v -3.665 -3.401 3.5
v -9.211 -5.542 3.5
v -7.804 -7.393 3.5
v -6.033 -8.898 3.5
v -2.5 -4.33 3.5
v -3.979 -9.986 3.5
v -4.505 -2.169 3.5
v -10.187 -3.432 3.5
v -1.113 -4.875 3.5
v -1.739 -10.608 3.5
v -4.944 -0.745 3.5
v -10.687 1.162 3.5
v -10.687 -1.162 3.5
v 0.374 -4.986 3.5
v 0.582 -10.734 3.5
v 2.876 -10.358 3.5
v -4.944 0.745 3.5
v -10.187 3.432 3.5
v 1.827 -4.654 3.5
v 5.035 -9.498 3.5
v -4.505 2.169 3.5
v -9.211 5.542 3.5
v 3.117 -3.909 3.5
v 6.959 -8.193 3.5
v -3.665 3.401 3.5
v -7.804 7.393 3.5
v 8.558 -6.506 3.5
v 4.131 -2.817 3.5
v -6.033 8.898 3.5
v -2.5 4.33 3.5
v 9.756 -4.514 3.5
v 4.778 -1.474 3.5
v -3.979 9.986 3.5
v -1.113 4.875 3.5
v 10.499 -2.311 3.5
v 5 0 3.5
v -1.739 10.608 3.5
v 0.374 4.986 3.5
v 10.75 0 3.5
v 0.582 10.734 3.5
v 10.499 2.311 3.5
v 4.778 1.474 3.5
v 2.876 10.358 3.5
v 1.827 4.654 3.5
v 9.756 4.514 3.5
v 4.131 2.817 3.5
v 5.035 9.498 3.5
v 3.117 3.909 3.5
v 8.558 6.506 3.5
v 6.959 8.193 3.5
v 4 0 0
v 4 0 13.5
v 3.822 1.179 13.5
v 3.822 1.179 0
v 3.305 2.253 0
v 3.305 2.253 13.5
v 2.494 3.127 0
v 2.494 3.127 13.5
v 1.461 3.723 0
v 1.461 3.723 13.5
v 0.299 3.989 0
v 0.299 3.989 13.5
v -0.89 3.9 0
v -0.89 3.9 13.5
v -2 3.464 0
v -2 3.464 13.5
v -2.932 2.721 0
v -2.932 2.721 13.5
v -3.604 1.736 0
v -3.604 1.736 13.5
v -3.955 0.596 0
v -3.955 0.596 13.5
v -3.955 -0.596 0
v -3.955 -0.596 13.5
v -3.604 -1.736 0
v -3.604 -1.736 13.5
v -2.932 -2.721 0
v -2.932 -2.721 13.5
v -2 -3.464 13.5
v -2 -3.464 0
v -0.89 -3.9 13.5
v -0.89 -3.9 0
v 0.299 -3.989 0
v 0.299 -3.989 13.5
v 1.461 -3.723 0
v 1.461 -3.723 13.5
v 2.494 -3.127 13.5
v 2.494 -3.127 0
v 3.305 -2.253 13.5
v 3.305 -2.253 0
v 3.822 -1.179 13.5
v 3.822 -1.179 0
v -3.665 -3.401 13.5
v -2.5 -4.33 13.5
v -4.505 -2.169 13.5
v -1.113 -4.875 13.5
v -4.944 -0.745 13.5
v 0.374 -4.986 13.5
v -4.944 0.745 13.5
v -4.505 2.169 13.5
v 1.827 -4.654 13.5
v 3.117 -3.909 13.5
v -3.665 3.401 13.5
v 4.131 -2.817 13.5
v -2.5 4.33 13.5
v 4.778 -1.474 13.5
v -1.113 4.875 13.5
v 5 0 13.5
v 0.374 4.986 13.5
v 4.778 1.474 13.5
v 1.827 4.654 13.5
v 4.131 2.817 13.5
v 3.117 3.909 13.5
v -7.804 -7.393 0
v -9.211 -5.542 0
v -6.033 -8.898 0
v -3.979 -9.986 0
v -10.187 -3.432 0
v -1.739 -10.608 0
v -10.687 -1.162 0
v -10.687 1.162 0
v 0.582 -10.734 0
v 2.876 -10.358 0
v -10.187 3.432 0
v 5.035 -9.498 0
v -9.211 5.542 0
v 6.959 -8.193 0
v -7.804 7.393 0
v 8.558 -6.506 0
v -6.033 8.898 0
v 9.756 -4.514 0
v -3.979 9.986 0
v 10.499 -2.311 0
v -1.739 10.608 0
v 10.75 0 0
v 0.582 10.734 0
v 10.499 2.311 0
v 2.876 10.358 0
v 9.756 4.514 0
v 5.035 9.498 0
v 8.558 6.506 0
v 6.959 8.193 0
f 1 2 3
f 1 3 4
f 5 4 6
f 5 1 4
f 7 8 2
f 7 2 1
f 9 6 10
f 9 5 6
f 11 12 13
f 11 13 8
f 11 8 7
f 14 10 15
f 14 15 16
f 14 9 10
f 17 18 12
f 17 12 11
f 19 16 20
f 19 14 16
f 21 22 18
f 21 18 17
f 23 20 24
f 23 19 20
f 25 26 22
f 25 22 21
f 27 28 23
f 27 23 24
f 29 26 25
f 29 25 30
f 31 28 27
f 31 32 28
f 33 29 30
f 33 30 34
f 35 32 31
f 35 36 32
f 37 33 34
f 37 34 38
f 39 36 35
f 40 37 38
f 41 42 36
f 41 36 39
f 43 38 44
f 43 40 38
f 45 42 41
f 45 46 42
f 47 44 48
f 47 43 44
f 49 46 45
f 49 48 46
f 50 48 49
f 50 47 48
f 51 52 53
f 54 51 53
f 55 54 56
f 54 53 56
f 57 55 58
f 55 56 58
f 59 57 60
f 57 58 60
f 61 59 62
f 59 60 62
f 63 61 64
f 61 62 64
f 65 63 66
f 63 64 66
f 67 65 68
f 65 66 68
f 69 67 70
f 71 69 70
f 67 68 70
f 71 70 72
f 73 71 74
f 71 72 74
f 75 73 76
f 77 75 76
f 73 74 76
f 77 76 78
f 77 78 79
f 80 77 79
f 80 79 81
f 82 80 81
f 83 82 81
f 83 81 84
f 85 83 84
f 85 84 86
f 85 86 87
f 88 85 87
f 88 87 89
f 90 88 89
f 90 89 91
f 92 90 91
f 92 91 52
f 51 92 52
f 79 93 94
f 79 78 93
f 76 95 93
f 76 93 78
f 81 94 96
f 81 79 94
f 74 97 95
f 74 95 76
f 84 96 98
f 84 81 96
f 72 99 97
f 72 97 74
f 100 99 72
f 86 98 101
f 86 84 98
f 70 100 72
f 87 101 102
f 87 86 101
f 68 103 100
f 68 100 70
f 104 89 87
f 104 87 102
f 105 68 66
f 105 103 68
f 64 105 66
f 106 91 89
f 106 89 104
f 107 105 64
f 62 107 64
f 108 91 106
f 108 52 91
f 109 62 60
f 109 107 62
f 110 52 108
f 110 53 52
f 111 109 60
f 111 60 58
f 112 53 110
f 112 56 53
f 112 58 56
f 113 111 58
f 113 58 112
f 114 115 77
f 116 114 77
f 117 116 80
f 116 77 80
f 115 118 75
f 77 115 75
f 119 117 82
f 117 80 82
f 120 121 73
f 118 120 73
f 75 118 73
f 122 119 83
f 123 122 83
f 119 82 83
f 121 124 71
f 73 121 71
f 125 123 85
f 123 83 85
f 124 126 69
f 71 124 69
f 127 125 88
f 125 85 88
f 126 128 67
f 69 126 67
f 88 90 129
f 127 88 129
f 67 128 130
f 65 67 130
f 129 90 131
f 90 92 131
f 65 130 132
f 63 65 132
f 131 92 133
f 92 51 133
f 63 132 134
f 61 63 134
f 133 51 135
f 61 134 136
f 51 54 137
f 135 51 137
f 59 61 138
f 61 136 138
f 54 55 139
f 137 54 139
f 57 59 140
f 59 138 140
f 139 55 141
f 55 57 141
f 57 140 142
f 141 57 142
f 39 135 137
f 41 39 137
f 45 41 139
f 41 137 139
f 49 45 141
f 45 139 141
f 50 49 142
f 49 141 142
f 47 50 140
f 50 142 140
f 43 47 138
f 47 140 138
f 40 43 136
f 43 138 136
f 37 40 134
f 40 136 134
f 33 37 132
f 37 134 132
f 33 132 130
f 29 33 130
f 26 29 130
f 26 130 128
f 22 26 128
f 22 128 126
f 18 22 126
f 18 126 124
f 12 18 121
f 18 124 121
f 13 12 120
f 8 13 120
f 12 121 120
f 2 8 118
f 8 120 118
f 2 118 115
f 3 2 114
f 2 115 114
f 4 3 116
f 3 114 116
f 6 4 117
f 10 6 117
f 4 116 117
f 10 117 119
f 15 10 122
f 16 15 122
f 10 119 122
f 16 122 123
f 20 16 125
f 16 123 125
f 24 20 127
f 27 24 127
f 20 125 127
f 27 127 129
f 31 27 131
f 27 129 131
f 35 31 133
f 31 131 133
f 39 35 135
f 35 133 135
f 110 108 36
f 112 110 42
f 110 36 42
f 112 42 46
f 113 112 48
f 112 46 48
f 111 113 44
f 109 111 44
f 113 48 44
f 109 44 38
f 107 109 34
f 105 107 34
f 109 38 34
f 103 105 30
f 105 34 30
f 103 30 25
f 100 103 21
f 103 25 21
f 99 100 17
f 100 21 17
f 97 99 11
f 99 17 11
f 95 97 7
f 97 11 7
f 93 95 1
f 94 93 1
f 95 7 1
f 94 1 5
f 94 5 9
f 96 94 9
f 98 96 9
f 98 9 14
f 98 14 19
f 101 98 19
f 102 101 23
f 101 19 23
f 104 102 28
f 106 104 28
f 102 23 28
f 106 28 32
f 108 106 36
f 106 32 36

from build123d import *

# Parameters (mm, degrees)
SKETCH1_R           = 10.75
BOSS_EXTRUDE1_DEPTH = 3.5
SKETCH2_R           = 5
BOSS_EXTRUDE2_DEPTH = 10
CUT_EXTRUDE1_REACH  = 22.332
SKETCH3_R           = 4


with BuildPart() as part:
    # Sketch1 → Boss-Extrude1 (new body)
    with BuildSketch(Plane.XY):
        Circle(SKETCH1_R)
    extrude(amount=BOSS_EXTRUDE1_DEPTH)

    # Sketch2 → Boss-Extrude2 (add)
    with BuildSketch(Plane.XY.offset(3.5)):
        Circle(SKETCH2_R)
    extrude(amount=BOSS_EXTRUDE2_DEPTH)

    # Sketch3 → Cut-Extrude1 (cut, up to next)
    with BuildSketch(Plane.XY.offset(13.5), mode=Mode.PRIVATE) as cut_extrude1_sk1:
        Circle(SKETCH3_R)
    cut_extrude1_tool1 = extrude(cut_extrude1_sk1.sketch, amount=-CUT_EXTRUDE1_REACH, mode=Mode.PRIVATE) & part.part
    add(cut_extrude1_tool1.solids().sort_by_distance((0, 0, 13.5))[0], mode=Mode.SUBTRACT)


solid = part.part
